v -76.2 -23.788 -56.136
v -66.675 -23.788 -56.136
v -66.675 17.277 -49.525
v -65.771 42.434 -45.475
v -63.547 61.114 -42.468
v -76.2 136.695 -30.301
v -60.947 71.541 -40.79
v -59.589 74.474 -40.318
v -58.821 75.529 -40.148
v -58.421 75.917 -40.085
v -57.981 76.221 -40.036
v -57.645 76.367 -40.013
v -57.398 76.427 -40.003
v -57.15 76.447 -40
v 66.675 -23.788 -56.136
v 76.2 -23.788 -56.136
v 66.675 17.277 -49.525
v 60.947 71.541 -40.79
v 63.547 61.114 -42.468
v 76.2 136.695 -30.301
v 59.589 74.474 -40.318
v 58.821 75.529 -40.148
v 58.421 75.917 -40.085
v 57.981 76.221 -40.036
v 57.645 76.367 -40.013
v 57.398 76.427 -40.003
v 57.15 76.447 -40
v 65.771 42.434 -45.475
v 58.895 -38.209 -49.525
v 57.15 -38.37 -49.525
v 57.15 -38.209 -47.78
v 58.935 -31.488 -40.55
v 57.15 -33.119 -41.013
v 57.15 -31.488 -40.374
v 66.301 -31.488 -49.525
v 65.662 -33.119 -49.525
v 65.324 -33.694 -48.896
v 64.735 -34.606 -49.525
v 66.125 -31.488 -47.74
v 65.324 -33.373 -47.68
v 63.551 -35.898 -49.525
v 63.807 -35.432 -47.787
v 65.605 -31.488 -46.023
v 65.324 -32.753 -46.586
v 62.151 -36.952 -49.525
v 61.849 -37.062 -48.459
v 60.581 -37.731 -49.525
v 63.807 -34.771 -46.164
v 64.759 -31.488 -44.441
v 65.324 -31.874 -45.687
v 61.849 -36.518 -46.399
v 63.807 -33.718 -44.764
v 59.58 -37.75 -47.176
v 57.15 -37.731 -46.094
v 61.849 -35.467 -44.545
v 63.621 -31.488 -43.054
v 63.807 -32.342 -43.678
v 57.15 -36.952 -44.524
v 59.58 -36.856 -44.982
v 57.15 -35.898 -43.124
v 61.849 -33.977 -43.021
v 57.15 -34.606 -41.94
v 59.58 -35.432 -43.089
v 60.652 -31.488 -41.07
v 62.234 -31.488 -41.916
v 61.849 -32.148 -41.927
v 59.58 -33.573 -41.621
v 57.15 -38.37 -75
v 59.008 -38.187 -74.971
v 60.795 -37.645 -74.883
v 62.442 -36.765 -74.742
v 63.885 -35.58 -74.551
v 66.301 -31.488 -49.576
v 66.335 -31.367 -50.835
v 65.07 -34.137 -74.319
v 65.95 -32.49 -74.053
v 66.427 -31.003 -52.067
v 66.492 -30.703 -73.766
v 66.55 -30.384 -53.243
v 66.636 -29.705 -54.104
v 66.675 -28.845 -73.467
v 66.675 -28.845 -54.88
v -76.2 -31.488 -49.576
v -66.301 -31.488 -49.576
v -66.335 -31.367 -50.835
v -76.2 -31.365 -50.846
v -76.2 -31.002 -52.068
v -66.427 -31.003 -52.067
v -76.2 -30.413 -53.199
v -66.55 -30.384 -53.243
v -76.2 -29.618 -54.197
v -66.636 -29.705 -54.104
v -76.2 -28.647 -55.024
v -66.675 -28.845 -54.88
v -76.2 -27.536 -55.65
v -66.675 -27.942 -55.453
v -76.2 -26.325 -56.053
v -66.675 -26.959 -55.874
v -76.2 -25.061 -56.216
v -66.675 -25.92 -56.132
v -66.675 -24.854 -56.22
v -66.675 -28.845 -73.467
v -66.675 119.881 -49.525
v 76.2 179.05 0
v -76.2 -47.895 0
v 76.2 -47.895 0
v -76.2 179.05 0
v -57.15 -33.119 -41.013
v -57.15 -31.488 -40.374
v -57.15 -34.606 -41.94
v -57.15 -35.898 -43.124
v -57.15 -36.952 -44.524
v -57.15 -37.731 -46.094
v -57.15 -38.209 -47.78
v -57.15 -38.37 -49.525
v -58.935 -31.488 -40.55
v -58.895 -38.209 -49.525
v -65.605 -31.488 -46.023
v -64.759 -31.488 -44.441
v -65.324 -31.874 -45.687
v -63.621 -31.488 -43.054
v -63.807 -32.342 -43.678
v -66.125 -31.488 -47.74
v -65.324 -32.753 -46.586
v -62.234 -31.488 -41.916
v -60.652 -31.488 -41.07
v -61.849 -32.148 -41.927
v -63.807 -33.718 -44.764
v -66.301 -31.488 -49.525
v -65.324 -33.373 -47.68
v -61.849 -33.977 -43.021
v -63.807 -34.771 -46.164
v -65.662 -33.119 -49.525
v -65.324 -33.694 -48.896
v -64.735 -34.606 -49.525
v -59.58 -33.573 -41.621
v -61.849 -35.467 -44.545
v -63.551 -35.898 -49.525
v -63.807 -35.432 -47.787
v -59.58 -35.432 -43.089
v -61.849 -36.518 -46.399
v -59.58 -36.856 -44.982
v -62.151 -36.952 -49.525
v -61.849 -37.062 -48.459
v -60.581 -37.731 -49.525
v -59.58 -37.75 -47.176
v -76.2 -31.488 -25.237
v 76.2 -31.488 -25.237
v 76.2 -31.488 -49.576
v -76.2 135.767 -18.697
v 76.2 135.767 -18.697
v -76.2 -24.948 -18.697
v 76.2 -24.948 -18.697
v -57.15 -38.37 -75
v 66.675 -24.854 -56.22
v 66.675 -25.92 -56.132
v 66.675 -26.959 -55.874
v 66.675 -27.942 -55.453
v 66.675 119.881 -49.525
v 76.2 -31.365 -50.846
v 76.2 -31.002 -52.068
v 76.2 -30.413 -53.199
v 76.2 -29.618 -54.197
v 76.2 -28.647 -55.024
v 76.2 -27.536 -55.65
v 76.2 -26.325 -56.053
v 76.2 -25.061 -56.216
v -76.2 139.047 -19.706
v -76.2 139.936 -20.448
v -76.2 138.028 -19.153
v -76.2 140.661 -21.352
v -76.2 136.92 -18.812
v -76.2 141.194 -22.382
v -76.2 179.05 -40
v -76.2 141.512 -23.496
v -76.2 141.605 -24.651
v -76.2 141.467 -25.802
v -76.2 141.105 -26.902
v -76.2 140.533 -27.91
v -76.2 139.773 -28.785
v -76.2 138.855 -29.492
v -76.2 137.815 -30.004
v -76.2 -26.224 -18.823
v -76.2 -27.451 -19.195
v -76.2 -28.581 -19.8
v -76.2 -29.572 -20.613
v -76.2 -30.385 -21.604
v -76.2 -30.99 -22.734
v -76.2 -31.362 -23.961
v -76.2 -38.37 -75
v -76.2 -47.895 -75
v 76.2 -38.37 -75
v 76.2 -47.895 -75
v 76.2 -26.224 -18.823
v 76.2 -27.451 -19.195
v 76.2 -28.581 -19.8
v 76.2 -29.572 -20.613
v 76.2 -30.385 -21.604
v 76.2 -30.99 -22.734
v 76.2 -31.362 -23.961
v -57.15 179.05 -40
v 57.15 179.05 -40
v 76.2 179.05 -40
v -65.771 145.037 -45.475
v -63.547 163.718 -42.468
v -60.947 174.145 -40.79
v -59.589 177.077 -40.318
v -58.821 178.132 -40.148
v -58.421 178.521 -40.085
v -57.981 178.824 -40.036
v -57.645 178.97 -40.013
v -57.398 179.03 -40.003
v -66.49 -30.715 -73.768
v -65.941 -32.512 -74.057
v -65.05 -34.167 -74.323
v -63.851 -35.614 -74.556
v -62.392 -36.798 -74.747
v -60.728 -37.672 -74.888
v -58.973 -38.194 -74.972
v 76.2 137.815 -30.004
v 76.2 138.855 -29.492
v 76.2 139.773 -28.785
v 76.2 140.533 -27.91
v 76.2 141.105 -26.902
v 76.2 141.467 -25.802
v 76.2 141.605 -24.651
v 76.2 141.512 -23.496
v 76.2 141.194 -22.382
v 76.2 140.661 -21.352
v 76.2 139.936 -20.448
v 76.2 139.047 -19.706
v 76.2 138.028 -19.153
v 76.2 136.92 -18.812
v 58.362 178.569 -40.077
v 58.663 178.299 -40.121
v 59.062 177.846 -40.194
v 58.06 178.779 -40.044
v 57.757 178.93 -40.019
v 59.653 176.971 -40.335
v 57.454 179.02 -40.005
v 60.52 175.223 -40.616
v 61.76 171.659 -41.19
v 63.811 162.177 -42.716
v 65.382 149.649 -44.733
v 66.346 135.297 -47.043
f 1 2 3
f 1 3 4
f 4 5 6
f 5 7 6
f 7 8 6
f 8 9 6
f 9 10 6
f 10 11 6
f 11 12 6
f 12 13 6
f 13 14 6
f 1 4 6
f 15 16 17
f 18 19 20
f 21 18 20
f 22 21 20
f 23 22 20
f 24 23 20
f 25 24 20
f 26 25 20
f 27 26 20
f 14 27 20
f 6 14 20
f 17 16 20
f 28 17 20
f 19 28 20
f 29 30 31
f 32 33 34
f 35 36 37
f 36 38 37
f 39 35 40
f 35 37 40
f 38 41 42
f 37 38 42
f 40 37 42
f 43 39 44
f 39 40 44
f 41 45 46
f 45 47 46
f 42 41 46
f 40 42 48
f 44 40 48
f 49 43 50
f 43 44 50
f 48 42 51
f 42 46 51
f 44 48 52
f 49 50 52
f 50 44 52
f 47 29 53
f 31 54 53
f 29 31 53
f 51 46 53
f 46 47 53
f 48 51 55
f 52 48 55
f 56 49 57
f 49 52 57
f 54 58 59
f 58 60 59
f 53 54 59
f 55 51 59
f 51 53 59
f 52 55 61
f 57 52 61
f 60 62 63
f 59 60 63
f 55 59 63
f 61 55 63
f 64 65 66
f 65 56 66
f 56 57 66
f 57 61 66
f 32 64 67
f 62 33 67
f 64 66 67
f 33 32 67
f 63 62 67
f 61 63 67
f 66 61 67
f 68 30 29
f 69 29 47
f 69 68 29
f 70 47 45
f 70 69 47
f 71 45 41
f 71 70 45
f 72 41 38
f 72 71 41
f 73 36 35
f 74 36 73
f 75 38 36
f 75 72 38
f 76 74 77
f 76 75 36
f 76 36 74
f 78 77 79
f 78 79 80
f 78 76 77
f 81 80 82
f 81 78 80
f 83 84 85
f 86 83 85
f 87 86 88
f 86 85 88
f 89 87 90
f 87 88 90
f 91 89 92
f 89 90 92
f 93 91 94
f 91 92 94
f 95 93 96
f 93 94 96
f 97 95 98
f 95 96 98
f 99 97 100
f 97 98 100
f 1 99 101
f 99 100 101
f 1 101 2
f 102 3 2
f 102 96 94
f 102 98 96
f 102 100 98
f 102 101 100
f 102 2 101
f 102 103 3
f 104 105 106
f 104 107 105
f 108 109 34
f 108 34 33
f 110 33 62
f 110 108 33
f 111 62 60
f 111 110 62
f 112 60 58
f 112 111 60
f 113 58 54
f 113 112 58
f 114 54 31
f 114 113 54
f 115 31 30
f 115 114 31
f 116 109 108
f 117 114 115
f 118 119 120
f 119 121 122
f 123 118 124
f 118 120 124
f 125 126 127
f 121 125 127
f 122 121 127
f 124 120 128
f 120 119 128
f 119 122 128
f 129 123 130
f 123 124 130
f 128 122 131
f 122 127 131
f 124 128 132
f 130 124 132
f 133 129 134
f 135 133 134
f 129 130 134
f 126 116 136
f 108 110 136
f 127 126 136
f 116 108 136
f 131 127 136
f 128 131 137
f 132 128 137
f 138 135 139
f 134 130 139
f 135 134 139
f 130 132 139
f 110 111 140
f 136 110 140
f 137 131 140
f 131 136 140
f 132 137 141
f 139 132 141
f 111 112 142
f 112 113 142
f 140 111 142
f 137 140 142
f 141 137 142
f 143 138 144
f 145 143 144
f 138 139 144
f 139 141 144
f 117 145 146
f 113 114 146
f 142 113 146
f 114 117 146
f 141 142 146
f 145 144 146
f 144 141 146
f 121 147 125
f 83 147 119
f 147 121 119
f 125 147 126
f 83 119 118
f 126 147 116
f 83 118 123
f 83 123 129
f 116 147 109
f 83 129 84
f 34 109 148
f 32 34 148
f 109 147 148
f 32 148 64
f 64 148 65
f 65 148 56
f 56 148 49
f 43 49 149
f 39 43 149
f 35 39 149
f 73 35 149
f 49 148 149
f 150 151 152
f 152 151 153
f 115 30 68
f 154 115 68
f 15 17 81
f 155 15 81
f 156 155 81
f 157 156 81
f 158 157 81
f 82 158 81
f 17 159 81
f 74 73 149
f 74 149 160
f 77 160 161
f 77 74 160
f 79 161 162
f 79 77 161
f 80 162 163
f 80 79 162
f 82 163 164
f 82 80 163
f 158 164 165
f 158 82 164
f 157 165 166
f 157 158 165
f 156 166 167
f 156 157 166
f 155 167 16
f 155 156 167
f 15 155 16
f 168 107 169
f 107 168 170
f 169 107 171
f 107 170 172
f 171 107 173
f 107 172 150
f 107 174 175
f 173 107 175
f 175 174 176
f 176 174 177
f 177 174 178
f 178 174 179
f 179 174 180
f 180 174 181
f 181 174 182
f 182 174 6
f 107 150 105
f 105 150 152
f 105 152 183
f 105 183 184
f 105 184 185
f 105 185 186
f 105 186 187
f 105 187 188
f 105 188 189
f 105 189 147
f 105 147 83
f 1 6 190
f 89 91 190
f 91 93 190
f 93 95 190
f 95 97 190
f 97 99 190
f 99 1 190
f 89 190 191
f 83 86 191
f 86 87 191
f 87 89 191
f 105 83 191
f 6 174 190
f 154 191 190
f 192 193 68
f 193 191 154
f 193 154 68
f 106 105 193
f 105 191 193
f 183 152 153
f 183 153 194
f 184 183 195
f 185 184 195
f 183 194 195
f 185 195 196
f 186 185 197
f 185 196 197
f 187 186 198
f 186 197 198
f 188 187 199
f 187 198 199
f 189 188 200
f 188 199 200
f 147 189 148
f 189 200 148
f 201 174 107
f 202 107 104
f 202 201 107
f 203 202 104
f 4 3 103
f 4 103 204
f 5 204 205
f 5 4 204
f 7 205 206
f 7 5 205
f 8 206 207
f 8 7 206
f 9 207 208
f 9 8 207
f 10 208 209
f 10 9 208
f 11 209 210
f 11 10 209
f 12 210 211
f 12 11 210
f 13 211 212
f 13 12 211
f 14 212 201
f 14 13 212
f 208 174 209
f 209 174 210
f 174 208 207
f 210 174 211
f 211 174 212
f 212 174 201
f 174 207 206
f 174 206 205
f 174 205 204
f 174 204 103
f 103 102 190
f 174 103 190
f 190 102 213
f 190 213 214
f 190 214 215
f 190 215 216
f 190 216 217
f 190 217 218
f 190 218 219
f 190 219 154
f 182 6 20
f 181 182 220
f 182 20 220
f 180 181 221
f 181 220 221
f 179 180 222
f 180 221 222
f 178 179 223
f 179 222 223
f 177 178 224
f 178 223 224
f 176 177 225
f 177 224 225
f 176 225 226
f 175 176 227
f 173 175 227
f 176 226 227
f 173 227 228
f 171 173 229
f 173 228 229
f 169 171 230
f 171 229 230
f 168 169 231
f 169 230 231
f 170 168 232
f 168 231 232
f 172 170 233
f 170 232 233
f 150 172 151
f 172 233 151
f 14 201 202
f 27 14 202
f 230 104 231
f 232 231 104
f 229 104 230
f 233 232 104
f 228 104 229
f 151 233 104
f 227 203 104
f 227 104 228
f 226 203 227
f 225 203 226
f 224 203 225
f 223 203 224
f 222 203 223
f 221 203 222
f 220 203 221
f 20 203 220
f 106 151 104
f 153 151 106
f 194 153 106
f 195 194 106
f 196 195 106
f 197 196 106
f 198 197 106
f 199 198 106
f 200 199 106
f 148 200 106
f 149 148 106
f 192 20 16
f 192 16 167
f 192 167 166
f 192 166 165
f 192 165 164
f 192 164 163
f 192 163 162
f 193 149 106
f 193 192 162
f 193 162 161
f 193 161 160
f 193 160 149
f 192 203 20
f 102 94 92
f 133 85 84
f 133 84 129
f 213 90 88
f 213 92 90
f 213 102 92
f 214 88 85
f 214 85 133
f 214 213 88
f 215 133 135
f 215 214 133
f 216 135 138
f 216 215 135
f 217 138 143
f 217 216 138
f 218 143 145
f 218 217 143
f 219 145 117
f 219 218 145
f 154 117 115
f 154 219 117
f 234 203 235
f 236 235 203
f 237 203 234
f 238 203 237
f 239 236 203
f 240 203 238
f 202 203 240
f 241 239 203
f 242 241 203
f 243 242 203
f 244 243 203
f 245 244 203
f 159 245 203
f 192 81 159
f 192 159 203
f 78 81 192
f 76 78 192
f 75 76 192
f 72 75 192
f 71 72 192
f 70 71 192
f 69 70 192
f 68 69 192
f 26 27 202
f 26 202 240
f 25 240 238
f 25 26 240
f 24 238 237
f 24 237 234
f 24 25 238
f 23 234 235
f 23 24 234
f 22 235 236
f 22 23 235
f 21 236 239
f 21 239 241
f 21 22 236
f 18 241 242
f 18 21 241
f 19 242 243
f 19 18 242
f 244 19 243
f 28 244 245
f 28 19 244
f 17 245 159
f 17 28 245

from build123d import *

# Parameters (mm, degrees)
SKETCH1_W                       = 152.4
SKETCH1_H                       = 40
BOSS_EXTRUDE1_DEPTH             = 179.05
BOSS_EXTRUDE1_DEPTH_BACK        = 100
BOSS_EXTRUDE2_REACH             = 200.659
SKETCH3_W                       = 75
SKETCH3_H                       = 9.525
BOSS_EXTRUDE2_DIRECTION_2_REACH = 200.659
RIB1_REACH                      = 248.799
SKETCH4_WALL_W                  = 715.816770022
SKETCH4_WALL_H                  = 9.525
FILLET1_R                       = 9.525
CUT_EXTRUDE1_REACH              = 210.543
CUT_EXTRUDE1_DIRECTION_2_REACH  = 210.543


with BuildPart() as part:
    # Sketch1 → Boss-Extrude1 (new, two sides)
    with BuildSketch(Plane(origin=(0, 0, 0), x_dir=(1, 0, 0), z_dir=(0, 1, 0))) as boss_extrude1_sk:
        with Locations((0, 20)):
            Rectangle(SKETCH1_W, SKETCH1_H)
    extrude(amount=BOSS_EXTRUDE1_DEPTH)
    extrude(boss_extrude1_sk.sketch, amount=-BOSS_EXTRUDE1_DEPTH_BACK)

    # SurfaceCut1
    split(bisect_by=Plane(origin=(0, -47.895, 0), x_dir=(1, 0, 0), z_dir=(0, 1, 0)), keep=Keep.TOP)

    # Boss-Extrude2: up to this face of the body (flat: up to its plane)
    boss_extrude2_end = Plane(part.part.faces().sort_by_distance((76.2, 65.5775, -20))[0])
    # Sketch3 → Boss-Extrude2 (add, up to the picked face)
    with BuildSketch(Plane(origin=(0, 0, 0), x_dir=(0, 0, -1), z_dir=(1, 0, 0)), mode=Mode.PRIVATE) as boss_extrude2_sk1:
        with Locations((37.5, -43.1325)):
            Rectangle(SKETCH3_W, SKETCH3_H)
    boss_extrude2_tool1 = split(extrude(boss_extrude2_sk1.sketch, amount=BOSS_EXTRUDE2_REACH, mode=Mode.PRIVATE), bisect_by=boss_extrude2_end, keep=Keep.BOTH, mode=Mode.PRIVATE)
    add(boss_extrude2_tool1.solids().sort_by(Axis((0, -43.1325, -37.5), (1, 0, 0)))[0])

    # Boss-Extrude2 direction 2: up to this face of the body (flat: up to its plane)
    boss_extrude2_direction_2_end = Plane(part.part.faces().sort_by_distance((-76.2, 65.5775, -20))[0])
    # Sketch3 → Boss-Extrude2 direction 2 (add, up to the picked face)
    with BuildSketch(Plane(origin=(0, 0, 0), x_dir=(0, 0, -1), z_dir=(1, 0, 0)), mode=Mode.PRIVATE) as boss_extrude2_direction_2_sk1:
        with Locations((37.5, -43.1325)):
            Rectangle(SKETCH3_W, SKETCH3_H)
    boss_extrude2_direction_2_tool1 = split(extrude(boss_extrude2_direction_2_sk1.sketch, amount=-BOSS_EXTRUDE2_DIRECTION_2_REACH, mode=Mode.PRIVATE), bisect_by=boss_extrude2_direction_2_end, keep=Keep.BOTH, mode=Mode.PRIVATE)
    add(boss_extrude2_direction_2_tool1.solids().sort_by(Axis((0, -43.1325, -37.5), (-1, 0, 0)))[0])

    # Sketch4 wall → Rib1 (add, up to next)
    with BuildSketch(Plane(origin=(76.2, 70.34, -57.5), x_dir=(0, -0.987289431969, -0.158932619441), z_dir=(0, 0.158932619441, -0.987289431969)), mode=Mode.PRIVATE) as rib1_sk1:
        with Locations((0, 4.7625)):
            Rectangle(SKETCH4_WALL_W, SKETCH4_WALL_H)
    rib1_tool1 = extrude(rib1_sk1.sketch, amount=-RIB1_REACH, mode=Mode.PRIVATE) - part.part
    rib1 = rib1_tool1.solids().sort_by_distance((76.2, 70.34, -57.5))[0]
    add(rib1)

    # Mirror1: Rib1 across plane
    add(rib1.mirror(Plane(origin=(0, 0, 0), x_dir=(0, 0, 1), z_dir=(1, 0, 0))))

    # Fillet1
    fillet1_edges = [part.edges().sort_by_distance(p)[0] for p in [
        (0, -38.37, -40),
        (66.675, -38.37, -57.5),
        (66.675, 70.34, -40),
        (-66.675, 70.34, -40),
        (-66.675, -38.37, -57.5),
    ]]
    fillet(fillet1_edges, radius=FILLET1_R)

    # Cut-Extrude1: up to this face of the body (flat: up to its plane)
    cut_extrude1_end = Plane(part.part.faces().sort_by_distance((-76.2, 53.773975166, -30.062668553))[0])
    # Sketch8 → Cut-Extrude1 (cut, up to the picked face)
    with BuildSketch(Plane(origin=(0, 0, 0), x_dir=(0, 0, -1), z_dir=(1, 0, 0)), mode=Mode.PRIVATE) as cut_extrude1_sk1:
        with BuildLine():
            Line((25.236746286, -31.487519231), (49.576175238, -31.487519231))
            ThreePointArc((49.576175238, -31.487519231), (54.633662665, -29.152106057), (56.135591687, -23.787728834))
            Line((56.135591687, -23.787728834), (30.301291161, 136.694946031))
            ThreePointArc((30.301291161, 136.694946031), (24.071010718, 141.587364194), (18.697485511, 135.766936654))
            Line((18.697485511, 135.766936654), (18.697485511, -24.948258456))
            ThreePointArc((18.697485511, -24.948258456), (20.612790648, -29.572214094), (25.236746286, -31.487519231))
        make_face()
    cut_extrude1_tool1 = split(extrude(cut_extrude1_sk1.sketch, amount=-CUT_EXTRUDE1_REACH, mode=Mode.PRIVATE), bisect_by=cut_extrude1_end, keep=Keep.BOTH, mode=Mode.PRIVATE)
    add(cut_extrude1_tool1.solids().sort_by(Axis((0, 38.89099, -32.356169), (-1, 0, 0)))[0], mode=Mode.SUBTRACT)

    # Cut-Extrude1 direction 2: up to this face of the body (flat: up to its plane)
    cut_extrude1_direction_2_end = Plane(part.part.faces().sort_by_distance((76.2, 53.773975166, -30.062668553))[0])
    # Sketch8 → Cut-Extrude1 direction 2 (cut, up to the picked face)
    with BuildSketch(Plane(origin=(0, 0, 0), x_dir=(0, 0, -1), z_dir=(1, 0, 0)), mode=Mode.PRIVATE) as cut_extrude1_direction_2_sk1:
        with BuildLine():
            Line((25.236746286, -31.487519231), (49.576175238, -31.487519231))
            ThreePointArc((49.576175238, -31.487519231), (54.633662665, -29.152106057), (56.135591687, -23.787728834))
            Line((56.135591687, -23.787728834), (30.301291161, 136.694946031))
            ThreePointArc((30.301291161, 136.694946031), (24.071010718, 141.587364194), (18.697485511, 135.766936654))
            Line((18.697485511, 135.766936654), (18.697485511, -24.948258456))
            ThreePointArc((18.697485511, -24.948258456), (20.612790648, -29.572214094), (25.236746286, -31.487519231))
        make_face()
    cut_extrude1_direction_2_tool1 = split(extrude(cut_extrude1_direction_2_sk1.sketch, amount=CUT_EXTRUDE1_DIRECTION_2_REACH, mode=Mode.PRIVATE), bisect_by=cut_extrude1_direction_2_end, keep=Keep.BOTH, mode=Mode.PRIVATE)
    add(cut_extrude1_direction_2_tool1.solids().sort_by(Axis((0, 38.89099, -32.356169), (1, 0, 0)))[0], mode=Mode.SUBTRACT)


solid = part.part
